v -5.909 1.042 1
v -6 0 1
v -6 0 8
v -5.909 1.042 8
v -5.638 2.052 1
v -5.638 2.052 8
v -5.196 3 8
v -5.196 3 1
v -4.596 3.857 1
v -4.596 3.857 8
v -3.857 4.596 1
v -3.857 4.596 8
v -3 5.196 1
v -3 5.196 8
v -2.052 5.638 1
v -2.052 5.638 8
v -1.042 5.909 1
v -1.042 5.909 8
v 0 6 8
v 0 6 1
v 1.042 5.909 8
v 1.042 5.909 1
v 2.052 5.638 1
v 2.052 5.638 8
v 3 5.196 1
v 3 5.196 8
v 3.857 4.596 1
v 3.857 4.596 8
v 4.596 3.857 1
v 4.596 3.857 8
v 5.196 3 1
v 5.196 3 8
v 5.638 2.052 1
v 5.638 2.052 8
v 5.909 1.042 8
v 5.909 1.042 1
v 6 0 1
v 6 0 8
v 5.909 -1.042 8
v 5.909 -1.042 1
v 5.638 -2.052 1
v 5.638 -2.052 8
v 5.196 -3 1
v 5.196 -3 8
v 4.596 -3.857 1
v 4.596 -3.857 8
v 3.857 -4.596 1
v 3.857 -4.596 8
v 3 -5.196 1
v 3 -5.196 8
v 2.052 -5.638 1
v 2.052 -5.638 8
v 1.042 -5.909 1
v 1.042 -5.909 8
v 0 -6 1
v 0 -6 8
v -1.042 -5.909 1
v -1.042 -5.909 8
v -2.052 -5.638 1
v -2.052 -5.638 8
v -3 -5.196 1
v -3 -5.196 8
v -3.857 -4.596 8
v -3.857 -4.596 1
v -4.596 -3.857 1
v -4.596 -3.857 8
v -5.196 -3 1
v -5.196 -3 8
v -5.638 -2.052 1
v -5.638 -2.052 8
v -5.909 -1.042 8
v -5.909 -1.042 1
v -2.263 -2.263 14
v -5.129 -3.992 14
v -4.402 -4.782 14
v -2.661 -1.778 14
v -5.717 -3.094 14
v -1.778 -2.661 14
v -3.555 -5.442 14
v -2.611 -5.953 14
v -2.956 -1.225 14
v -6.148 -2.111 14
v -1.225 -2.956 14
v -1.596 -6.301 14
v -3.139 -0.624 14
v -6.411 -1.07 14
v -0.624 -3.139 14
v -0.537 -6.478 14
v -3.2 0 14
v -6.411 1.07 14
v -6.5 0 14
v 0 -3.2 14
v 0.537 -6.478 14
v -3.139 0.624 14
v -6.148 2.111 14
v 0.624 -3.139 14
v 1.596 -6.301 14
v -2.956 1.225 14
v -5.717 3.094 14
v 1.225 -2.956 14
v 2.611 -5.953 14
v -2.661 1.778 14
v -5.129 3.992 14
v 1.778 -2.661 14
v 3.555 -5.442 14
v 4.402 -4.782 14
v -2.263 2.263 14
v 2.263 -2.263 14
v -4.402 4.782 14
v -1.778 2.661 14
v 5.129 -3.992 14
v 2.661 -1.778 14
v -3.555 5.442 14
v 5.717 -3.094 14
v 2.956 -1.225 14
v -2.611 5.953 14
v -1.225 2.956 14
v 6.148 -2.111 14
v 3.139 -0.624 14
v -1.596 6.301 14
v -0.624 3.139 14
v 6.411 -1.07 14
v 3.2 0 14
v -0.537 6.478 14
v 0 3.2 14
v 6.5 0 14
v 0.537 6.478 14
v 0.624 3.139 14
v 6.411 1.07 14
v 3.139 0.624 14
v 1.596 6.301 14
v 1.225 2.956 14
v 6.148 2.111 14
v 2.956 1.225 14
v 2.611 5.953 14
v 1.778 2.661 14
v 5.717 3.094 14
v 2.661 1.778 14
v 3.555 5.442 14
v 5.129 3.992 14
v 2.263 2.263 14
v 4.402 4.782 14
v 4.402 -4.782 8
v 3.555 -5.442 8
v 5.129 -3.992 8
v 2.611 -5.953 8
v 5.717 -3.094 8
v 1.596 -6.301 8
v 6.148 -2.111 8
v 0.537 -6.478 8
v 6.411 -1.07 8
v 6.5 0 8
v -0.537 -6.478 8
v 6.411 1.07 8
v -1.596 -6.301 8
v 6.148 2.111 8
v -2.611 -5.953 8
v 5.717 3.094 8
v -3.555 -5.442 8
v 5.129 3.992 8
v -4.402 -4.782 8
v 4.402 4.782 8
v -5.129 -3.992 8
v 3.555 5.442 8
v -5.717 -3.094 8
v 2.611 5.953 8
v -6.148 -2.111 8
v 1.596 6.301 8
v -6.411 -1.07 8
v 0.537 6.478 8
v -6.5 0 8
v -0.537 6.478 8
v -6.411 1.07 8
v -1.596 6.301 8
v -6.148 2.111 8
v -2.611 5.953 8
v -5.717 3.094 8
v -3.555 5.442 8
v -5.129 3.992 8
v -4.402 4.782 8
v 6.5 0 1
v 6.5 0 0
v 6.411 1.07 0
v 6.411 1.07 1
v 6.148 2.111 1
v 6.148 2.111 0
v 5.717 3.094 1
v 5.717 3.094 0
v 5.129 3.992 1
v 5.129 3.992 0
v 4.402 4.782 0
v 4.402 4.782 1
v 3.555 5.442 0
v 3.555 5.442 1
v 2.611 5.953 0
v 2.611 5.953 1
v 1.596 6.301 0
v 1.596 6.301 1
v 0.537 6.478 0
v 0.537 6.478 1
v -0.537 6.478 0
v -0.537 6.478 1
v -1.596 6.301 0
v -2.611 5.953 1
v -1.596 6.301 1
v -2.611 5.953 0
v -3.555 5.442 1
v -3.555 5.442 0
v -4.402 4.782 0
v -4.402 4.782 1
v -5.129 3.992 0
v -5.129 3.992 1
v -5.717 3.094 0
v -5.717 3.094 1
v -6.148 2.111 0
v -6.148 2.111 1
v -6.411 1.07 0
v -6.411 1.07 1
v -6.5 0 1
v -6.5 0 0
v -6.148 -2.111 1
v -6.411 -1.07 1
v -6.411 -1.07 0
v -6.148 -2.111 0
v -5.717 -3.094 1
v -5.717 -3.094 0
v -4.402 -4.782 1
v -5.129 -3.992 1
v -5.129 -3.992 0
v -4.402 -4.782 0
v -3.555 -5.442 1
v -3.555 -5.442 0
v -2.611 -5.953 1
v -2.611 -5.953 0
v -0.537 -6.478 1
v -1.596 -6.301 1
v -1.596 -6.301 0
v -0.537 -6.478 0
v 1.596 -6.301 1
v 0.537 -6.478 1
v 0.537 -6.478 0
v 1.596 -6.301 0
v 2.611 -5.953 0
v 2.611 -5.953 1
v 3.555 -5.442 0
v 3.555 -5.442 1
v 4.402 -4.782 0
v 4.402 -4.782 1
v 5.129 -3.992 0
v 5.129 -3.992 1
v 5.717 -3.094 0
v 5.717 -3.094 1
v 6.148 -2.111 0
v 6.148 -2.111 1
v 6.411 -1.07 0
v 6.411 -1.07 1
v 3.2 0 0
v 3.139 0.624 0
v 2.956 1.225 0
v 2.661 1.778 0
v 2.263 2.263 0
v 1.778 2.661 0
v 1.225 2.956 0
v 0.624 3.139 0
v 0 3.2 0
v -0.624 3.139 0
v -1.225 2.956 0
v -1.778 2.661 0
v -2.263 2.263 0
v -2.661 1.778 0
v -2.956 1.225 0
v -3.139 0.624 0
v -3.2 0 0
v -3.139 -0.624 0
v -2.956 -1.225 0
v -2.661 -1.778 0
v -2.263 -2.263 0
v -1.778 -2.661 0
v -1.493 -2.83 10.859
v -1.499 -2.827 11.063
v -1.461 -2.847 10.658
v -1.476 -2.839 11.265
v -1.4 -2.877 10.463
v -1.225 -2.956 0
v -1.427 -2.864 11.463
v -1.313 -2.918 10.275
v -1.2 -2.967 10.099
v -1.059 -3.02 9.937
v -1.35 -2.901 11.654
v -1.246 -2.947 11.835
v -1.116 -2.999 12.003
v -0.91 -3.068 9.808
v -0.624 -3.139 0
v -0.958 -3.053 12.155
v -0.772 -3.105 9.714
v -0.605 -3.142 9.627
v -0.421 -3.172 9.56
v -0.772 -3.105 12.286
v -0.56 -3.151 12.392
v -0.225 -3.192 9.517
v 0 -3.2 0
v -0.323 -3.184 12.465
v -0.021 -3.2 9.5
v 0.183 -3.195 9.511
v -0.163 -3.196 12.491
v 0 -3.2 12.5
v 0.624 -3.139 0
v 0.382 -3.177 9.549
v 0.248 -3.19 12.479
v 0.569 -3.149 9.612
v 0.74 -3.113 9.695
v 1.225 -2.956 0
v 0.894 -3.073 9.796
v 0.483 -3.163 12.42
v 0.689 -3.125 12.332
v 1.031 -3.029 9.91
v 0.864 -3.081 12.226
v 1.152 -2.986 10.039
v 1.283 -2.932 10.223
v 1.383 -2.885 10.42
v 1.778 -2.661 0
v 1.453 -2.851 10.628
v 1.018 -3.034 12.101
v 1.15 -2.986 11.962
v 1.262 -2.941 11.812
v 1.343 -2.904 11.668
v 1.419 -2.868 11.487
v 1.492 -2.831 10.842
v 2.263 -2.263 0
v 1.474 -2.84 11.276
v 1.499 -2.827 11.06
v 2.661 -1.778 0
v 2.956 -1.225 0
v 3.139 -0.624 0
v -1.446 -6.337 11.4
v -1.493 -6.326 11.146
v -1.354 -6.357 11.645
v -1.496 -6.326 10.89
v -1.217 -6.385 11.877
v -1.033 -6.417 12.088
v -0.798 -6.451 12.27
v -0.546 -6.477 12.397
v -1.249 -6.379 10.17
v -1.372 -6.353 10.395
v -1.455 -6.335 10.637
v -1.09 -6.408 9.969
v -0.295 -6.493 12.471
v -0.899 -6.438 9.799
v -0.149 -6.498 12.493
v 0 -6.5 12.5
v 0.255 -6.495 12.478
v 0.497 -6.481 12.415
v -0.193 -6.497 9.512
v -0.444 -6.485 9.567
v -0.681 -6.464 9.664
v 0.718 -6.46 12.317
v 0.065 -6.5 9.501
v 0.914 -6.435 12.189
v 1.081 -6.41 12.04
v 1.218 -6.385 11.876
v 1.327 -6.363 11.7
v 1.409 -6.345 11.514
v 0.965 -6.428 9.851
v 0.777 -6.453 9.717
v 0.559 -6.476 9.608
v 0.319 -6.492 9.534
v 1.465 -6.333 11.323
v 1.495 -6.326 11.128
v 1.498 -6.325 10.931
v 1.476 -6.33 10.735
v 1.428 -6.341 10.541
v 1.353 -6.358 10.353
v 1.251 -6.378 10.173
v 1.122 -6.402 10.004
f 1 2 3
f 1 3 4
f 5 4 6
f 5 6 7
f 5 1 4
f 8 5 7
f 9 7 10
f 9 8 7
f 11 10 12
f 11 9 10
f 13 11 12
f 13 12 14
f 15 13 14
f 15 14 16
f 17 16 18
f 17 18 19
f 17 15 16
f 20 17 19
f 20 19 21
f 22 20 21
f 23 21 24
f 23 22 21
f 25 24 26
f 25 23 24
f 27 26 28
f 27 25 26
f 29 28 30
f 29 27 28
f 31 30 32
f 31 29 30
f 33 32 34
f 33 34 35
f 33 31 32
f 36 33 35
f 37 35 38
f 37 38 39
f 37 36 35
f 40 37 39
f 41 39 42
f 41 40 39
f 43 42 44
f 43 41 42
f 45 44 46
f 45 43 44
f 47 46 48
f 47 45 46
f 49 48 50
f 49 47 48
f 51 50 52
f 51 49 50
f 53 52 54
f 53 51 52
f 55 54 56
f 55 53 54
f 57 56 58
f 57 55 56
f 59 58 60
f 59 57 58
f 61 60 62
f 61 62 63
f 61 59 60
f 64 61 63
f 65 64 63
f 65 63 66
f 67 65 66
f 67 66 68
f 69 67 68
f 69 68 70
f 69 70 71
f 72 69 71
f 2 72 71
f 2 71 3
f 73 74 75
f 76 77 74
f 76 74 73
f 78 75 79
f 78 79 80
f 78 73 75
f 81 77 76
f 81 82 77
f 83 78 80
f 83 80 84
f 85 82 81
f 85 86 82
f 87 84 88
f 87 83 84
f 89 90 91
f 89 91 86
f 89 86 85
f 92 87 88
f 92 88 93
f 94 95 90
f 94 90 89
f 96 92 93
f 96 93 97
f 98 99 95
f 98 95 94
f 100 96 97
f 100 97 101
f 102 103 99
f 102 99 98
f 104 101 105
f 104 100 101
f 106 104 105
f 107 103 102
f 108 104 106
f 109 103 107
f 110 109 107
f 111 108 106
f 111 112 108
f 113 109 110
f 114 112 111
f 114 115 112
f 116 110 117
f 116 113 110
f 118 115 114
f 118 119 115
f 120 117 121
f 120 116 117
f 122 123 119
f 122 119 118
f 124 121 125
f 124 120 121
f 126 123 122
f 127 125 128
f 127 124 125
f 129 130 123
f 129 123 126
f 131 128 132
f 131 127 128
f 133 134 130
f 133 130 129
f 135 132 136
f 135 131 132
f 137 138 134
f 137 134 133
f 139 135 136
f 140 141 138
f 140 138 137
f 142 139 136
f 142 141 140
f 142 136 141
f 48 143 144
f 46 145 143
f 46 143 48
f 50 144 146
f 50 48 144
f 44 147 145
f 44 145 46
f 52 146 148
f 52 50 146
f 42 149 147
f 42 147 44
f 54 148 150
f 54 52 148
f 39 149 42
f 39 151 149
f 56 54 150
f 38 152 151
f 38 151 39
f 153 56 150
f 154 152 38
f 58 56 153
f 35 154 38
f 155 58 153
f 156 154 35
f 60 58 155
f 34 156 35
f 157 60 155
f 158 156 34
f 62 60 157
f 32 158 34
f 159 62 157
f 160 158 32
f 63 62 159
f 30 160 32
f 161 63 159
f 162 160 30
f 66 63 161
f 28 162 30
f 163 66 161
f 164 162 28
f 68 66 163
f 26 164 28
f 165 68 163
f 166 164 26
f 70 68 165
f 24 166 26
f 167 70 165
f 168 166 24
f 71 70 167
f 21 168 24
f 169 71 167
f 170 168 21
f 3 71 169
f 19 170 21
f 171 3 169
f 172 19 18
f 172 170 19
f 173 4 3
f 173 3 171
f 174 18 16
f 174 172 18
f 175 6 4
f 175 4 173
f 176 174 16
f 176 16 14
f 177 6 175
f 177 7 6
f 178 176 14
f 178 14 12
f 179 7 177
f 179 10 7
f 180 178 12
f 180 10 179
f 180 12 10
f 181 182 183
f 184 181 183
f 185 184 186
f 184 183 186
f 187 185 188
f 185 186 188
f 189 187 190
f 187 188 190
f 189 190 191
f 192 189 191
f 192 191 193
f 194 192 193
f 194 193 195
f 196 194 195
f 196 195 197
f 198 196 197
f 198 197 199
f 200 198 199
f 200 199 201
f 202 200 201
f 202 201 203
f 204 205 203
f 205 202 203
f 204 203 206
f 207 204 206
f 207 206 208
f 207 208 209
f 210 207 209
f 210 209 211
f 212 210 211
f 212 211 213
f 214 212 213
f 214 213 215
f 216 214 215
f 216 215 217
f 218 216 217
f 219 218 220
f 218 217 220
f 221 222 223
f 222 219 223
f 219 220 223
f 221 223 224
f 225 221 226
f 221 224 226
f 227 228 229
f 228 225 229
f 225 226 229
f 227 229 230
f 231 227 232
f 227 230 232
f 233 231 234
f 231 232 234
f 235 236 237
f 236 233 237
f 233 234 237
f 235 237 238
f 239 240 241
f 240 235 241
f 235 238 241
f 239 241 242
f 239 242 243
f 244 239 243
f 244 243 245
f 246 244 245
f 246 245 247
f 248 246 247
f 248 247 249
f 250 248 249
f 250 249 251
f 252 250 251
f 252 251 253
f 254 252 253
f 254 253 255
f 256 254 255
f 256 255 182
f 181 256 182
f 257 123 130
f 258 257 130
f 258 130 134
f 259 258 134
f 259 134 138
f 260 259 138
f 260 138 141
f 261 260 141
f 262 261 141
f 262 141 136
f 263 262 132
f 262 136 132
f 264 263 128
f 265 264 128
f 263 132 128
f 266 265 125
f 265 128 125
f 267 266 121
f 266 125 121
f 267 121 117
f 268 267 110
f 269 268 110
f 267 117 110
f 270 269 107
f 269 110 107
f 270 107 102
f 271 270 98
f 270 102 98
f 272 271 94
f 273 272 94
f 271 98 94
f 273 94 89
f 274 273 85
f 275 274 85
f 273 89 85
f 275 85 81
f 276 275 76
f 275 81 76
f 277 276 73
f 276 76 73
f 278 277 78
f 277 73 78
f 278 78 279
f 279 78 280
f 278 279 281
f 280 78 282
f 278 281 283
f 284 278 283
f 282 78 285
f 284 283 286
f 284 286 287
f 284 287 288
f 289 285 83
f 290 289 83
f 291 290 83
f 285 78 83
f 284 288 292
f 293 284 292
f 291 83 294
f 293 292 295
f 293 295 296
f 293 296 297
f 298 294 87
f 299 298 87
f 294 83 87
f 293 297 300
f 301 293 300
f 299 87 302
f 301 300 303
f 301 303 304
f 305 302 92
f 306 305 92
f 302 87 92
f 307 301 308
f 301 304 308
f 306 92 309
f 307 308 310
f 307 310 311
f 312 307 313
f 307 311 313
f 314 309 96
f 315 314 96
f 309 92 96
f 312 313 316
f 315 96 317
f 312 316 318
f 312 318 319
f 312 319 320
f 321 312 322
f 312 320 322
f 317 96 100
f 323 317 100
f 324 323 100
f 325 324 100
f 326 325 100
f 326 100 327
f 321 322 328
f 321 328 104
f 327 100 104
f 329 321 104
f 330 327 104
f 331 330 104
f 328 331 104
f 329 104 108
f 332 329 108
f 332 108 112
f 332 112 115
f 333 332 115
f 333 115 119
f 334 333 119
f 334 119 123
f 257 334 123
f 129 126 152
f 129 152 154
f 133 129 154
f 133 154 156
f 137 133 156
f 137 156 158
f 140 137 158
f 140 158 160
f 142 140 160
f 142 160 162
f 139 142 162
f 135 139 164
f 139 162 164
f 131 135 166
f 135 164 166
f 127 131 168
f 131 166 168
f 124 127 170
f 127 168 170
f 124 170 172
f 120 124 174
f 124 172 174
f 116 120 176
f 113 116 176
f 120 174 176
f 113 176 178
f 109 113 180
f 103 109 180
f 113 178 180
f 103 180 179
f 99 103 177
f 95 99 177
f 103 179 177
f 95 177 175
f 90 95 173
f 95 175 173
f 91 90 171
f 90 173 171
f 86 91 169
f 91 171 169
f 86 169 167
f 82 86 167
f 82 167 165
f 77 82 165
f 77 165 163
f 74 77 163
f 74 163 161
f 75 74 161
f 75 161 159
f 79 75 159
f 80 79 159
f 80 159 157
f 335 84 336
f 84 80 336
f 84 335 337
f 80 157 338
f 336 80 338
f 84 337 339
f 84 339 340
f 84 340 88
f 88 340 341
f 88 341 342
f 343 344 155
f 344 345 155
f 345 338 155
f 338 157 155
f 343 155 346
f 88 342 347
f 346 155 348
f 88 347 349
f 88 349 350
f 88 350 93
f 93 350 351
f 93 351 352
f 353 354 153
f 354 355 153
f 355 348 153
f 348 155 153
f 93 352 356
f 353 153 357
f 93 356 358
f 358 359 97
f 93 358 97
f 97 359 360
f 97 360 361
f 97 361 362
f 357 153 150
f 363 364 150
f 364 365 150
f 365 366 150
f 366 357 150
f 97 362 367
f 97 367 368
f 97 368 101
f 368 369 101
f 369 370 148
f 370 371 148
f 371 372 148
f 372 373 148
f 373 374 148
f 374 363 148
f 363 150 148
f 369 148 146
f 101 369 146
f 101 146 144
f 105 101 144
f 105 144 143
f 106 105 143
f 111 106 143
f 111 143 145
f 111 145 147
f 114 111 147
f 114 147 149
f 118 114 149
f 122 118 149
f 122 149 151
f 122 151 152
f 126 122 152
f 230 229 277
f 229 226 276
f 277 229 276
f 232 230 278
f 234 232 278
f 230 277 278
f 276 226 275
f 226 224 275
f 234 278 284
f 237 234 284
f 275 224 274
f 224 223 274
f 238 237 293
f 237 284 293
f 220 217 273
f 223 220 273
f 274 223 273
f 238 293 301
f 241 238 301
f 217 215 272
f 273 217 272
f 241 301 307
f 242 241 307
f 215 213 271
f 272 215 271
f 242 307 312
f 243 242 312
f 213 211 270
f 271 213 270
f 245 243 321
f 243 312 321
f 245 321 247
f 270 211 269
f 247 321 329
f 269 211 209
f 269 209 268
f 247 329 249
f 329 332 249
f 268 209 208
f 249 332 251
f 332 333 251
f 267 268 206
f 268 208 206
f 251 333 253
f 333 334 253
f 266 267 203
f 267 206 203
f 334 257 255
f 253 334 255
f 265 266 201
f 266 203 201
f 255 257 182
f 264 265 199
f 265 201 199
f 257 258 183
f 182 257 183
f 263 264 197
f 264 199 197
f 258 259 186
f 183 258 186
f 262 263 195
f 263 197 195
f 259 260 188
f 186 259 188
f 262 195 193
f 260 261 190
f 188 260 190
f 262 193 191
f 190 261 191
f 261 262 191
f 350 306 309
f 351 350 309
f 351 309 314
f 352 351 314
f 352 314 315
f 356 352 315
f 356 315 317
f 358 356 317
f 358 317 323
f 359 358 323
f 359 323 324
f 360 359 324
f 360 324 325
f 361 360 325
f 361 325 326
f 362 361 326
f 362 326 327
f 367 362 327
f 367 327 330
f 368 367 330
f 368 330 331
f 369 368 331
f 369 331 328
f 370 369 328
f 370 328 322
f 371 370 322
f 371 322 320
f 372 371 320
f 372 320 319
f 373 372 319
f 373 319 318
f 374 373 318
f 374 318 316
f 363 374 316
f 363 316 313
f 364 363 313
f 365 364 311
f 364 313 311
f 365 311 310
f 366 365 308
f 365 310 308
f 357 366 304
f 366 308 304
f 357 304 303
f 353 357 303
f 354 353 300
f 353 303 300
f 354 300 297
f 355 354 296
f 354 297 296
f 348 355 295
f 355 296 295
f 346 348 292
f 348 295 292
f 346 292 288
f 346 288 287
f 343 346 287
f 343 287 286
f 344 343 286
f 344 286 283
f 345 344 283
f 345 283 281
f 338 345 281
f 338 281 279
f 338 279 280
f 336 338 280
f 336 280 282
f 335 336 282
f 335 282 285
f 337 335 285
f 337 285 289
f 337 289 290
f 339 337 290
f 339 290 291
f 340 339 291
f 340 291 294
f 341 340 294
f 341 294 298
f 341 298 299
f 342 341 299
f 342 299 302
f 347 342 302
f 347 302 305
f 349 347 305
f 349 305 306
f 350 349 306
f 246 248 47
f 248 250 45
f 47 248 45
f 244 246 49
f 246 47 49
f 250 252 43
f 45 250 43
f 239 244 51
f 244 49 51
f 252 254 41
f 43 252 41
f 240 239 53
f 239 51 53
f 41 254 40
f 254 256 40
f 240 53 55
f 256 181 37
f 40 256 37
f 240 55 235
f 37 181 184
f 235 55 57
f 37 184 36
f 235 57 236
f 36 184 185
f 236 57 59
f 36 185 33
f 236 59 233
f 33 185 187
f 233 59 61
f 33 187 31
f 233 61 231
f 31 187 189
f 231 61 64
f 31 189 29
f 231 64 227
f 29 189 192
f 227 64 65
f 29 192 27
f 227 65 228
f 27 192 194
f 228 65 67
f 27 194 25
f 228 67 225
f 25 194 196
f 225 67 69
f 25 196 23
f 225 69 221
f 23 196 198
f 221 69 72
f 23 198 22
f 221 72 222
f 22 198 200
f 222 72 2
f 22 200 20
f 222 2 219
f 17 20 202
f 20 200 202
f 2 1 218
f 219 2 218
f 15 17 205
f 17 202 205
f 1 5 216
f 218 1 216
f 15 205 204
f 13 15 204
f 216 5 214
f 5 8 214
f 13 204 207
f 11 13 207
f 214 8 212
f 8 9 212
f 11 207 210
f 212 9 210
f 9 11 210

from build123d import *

# Parameters (mm, degrees)
SKETCH1_R           = 6.5
BOSS_EXTRUDE1_DEPTH = 14
SKETCH2_R           = 3.2
CUT_EXTRUDE1_DEPTH  = 17.748134224
SKETCH3_R           = 6.5
SKETCH3_R_2         = 6
CUT_EXTRUDE2_DEPTH  = 7
SKETCH4_R           = 1.5
CUT_EXTRUDE3_DEPTH  = 7


with BuildPart() as part:
    # Sketch1 → Boss-Extrude1 (new body)
    with BuildSketch(Plane.XY):
        Circle(SKETCH1_R)
    extrude(amount=BOSS_EXTRUDE1_DEPTH)

    # Sketch2 → Cut-Extrude1 (cut, through all)
    with BuildSketch(Plane.XY.offset(14)):
        Circle(SKETCH2_R)
    extrude(amount=-CUT_EXTRUDE1_DEPTH, mode=Mode.SUBTRACT)

    # Sketch3 → Cut-Extrude2 (cut)
    with BuildSketch(Plane(origin=(0, 0, 1), x_dir=(-1, 0, 0), z_dir=(0, 0, -1))):
        Circle(SKETCH3_R)
        Circle(SKETCH3_R_2, mode=Mode.SUBTRACT)
    extrude(amount=-CUT_EXTRUDE2_DEPTH, mode=Mode.SUBTRACT)

    # Sketch4 → Cut-Extrude3 (cut)
    with BuildSketch(Plane(origin=(0, 0, 0), x_dir=(1, 0, 0), z_dir=(0, 1, 0))):
        with Locations(Location((0, -11, 0), (0, 0, 270))):
            Circle(SKETCH4_R)
    extrude(amount=-CUT_EXTRUDE3_DEPTH, mode=Mode.SUBTRACT)


solid = part.part
